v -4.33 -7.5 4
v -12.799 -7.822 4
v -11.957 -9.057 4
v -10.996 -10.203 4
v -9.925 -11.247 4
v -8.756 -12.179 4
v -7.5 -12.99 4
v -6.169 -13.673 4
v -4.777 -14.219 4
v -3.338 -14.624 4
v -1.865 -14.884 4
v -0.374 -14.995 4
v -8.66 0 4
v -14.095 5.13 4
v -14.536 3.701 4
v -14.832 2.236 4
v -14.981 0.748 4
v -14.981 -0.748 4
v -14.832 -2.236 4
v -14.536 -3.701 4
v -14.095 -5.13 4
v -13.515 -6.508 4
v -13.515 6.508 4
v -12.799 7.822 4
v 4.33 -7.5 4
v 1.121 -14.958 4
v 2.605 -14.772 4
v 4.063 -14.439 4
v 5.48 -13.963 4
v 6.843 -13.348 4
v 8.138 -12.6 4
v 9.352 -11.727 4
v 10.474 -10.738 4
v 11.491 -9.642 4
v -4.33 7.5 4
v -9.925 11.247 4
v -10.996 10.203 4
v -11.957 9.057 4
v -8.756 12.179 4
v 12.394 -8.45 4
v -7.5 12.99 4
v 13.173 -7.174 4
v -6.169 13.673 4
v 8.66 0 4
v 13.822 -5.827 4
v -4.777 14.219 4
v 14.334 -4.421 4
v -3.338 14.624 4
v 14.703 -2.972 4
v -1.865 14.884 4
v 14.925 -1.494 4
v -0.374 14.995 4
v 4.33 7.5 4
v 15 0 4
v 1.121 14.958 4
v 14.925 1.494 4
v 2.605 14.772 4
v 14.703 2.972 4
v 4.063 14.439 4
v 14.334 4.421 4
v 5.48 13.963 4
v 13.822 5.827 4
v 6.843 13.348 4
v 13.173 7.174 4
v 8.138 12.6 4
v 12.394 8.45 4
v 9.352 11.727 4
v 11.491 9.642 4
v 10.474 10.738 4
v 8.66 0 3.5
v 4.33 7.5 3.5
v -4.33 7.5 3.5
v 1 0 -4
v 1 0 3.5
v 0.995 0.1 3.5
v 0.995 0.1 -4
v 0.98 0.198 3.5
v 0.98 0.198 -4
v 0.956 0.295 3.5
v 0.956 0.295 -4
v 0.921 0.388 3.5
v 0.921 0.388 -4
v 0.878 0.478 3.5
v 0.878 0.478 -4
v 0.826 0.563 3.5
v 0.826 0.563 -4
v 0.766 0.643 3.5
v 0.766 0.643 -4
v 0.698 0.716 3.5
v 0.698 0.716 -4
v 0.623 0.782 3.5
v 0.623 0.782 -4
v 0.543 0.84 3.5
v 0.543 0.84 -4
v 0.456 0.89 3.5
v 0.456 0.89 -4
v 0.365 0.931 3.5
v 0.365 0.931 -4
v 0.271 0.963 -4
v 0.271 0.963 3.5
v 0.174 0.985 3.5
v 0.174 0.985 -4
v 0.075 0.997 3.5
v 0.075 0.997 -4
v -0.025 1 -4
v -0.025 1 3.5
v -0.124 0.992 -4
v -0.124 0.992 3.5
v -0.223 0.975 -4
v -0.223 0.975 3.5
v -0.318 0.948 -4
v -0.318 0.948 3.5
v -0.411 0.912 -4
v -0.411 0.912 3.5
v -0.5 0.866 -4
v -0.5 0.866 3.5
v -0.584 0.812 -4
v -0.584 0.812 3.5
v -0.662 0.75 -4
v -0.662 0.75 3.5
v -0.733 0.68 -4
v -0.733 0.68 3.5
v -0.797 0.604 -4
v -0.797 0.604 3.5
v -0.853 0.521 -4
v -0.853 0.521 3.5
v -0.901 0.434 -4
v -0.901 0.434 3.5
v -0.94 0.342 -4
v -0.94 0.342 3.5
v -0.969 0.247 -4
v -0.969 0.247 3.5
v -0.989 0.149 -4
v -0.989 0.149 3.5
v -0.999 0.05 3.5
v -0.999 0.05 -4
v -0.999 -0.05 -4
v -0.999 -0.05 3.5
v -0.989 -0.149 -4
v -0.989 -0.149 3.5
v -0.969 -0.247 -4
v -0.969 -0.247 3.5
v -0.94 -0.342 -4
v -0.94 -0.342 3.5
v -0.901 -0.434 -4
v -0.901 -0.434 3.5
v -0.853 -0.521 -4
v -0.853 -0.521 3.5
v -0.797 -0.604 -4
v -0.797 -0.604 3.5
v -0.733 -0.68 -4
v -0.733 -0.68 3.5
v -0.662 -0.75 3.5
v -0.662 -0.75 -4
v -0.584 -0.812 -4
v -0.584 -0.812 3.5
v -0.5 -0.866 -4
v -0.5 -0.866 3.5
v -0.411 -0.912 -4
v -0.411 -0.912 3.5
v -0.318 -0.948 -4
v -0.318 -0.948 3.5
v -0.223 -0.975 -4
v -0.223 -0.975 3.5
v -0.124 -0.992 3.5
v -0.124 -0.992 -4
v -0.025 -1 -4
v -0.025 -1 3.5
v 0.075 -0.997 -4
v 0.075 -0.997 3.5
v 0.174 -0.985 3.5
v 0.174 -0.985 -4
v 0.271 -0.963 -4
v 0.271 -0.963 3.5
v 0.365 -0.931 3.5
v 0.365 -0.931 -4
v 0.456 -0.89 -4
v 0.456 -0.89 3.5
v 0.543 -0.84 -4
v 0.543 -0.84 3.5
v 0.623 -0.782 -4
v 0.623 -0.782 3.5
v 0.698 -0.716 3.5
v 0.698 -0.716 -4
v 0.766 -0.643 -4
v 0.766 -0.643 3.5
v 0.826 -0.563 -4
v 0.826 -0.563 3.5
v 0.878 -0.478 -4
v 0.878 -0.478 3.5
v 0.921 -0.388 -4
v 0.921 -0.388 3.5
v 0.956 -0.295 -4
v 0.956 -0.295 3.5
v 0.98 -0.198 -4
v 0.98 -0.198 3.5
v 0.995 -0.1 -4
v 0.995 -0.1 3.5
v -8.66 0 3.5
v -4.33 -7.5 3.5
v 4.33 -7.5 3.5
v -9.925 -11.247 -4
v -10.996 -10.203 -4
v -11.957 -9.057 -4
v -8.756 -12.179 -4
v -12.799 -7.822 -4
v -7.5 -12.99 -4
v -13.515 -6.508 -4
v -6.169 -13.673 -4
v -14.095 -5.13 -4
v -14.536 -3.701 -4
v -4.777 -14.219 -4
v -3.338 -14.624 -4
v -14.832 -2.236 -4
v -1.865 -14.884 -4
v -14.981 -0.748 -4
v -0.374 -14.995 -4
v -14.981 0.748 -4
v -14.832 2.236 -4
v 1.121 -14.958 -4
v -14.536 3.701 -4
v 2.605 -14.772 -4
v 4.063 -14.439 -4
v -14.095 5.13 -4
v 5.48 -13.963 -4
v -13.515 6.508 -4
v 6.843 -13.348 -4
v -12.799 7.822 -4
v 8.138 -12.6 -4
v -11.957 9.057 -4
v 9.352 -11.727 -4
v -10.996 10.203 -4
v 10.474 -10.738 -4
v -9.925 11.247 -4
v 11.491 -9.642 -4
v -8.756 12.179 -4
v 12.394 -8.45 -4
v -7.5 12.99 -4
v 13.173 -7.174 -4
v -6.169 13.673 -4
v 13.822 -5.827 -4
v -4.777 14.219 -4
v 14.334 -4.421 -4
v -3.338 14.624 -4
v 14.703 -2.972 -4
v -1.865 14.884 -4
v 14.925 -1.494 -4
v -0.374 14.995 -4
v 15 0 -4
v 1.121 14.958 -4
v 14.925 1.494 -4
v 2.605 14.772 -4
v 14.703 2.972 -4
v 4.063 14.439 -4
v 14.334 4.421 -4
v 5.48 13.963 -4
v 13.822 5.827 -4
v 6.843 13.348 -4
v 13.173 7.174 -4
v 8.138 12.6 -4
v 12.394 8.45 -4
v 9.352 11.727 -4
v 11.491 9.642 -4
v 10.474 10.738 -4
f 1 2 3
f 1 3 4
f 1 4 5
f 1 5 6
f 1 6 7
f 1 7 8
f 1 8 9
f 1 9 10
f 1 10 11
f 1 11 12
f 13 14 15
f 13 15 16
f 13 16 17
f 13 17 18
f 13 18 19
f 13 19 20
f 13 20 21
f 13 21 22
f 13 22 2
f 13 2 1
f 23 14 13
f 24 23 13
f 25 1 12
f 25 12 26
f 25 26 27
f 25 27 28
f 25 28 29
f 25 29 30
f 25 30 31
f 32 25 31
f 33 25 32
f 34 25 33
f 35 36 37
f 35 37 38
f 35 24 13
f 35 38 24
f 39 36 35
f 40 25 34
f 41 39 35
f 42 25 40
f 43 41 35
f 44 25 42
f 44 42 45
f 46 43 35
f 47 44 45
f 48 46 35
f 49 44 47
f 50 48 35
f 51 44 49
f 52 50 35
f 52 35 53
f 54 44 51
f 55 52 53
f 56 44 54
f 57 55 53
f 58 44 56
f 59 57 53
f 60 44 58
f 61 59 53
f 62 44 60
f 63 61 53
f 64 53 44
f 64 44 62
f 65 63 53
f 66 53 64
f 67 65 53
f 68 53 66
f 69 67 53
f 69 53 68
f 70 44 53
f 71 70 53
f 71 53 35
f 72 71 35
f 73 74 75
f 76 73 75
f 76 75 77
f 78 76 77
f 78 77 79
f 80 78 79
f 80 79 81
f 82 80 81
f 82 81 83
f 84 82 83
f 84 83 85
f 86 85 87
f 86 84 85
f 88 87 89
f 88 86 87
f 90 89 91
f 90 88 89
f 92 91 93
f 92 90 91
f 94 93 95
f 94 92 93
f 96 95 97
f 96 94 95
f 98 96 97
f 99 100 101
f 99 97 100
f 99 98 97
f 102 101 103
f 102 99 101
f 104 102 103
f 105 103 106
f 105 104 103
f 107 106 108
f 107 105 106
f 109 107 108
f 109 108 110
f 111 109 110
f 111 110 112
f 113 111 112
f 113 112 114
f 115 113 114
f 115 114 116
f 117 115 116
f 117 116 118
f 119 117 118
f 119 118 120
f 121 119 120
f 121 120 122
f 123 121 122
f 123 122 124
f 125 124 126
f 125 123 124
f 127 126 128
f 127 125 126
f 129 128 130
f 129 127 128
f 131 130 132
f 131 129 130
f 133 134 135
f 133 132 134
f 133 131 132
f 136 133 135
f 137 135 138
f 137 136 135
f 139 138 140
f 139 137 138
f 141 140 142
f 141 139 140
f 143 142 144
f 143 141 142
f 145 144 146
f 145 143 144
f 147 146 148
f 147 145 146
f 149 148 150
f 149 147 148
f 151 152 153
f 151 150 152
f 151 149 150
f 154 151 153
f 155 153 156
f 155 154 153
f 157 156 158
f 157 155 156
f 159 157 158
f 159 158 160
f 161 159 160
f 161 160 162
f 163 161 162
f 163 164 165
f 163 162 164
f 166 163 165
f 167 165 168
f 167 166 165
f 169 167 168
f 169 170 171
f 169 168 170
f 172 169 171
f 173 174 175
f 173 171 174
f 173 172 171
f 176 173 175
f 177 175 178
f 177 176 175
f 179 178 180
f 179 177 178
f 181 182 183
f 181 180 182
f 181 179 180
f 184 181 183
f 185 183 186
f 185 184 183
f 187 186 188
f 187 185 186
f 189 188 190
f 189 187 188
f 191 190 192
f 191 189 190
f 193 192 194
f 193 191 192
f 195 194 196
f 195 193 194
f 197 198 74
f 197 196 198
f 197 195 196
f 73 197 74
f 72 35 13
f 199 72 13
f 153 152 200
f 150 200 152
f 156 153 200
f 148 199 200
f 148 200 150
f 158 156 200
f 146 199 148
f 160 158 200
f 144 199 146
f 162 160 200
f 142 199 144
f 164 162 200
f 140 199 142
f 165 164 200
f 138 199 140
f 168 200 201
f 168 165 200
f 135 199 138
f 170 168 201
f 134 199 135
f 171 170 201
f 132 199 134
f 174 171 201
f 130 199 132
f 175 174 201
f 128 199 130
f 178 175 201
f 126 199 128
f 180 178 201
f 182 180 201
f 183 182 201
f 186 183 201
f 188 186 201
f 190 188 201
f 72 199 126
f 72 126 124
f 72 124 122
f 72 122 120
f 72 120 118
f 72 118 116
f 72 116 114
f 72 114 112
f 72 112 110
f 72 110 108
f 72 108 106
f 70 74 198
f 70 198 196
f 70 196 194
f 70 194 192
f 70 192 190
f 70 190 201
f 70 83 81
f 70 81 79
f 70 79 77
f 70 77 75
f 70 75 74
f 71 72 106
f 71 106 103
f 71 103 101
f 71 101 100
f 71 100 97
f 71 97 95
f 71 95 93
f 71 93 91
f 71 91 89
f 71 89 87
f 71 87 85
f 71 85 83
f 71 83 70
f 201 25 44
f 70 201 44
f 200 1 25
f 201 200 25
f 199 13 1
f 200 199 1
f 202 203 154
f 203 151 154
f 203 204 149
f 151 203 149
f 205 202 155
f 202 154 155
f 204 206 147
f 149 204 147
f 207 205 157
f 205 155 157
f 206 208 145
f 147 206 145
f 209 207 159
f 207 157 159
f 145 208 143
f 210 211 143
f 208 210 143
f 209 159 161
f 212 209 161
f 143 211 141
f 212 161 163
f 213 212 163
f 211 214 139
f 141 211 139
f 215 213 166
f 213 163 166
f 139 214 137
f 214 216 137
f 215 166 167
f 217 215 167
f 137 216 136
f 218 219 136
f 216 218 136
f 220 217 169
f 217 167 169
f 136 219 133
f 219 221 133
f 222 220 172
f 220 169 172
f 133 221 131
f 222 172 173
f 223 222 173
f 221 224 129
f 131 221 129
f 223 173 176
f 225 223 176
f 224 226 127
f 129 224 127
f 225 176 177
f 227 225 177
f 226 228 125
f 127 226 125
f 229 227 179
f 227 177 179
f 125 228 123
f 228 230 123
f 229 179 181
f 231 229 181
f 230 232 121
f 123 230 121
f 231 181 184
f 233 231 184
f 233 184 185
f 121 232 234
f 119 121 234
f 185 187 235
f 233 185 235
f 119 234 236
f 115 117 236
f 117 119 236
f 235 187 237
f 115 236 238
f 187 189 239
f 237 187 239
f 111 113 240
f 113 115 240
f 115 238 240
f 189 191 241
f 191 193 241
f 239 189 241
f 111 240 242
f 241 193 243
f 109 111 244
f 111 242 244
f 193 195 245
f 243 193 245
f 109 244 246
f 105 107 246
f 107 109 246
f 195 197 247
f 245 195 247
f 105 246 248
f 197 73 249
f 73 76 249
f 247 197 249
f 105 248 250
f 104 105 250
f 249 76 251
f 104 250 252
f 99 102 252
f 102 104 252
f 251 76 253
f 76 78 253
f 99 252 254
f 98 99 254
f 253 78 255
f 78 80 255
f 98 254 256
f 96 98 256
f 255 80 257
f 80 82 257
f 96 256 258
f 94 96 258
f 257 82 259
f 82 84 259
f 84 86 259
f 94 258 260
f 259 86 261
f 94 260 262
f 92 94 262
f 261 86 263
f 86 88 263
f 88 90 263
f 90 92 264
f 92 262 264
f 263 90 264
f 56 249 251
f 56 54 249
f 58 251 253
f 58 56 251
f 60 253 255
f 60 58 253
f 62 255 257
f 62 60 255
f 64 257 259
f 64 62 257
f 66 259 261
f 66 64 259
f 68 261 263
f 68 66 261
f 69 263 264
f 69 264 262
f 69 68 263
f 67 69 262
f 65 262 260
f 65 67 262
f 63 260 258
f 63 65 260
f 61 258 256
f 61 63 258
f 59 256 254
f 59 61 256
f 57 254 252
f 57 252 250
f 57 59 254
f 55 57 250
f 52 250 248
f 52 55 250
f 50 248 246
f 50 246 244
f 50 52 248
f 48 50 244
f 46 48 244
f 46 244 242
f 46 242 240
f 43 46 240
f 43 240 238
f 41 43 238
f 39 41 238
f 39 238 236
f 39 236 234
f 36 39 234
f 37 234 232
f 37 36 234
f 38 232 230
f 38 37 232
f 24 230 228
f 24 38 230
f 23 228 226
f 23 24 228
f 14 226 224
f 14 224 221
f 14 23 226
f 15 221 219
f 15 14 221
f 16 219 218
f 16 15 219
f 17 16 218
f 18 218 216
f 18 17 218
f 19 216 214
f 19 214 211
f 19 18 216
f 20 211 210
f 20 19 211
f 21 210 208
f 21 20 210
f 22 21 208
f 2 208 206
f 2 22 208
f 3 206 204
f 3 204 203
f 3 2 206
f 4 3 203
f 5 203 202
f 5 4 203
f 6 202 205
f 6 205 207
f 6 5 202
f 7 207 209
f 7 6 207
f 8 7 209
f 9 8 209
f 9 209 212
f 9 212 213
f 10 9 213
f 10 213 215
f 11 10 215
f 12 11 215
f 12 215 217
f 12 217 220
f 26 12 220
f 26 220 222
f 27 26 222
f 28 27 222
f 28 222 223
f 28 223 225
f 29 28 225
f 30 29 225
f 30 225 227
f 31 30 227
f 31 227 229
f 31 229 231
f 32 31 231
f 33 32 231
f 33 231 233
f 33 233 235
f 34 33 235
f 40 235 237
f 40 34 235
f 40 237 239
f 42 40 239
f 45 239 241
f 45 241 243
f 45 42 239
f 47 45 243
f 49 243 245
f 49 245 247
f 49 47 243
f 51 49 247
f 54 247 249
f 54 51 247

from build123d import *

# Parameters (mm, degrees)
SKETCH1_R           = 15
SKETCH1_R_2         = 1
BOSS_EXTRUDE1_DEPTH = 4
CUT_EXTRUDE1_DEPTH  = 0.5


with BuildPart() as part:
    # Sketch1 → Boss-Extrude1 (new, symmetric)
    with BuildSketch(Plane.XY):
        Circle(SKETCH1_R)
        Circle(SKETCH1_R_2, mode=Mode.SUBTRACT)
    extrude(amount=BOSS_EXTRUDE1_DEPTH, both=True)

    # Sketch2 → Cut-Extrude1 (cut)
    with BuildSketch(Plane.XY.offset(4)):
        Polygon((-4.330127019, 7.5), (-8.660254038, 0), (-4.330127019, -7.5), (4.330127019, -7.5), (8.660254038, 0), (4.330127019, 7.5), align=None)
    extrude(amount=-CUT_EXTRUDE1_DEPTH, mode=Mode.SUBTRACT)


solid = part.part
